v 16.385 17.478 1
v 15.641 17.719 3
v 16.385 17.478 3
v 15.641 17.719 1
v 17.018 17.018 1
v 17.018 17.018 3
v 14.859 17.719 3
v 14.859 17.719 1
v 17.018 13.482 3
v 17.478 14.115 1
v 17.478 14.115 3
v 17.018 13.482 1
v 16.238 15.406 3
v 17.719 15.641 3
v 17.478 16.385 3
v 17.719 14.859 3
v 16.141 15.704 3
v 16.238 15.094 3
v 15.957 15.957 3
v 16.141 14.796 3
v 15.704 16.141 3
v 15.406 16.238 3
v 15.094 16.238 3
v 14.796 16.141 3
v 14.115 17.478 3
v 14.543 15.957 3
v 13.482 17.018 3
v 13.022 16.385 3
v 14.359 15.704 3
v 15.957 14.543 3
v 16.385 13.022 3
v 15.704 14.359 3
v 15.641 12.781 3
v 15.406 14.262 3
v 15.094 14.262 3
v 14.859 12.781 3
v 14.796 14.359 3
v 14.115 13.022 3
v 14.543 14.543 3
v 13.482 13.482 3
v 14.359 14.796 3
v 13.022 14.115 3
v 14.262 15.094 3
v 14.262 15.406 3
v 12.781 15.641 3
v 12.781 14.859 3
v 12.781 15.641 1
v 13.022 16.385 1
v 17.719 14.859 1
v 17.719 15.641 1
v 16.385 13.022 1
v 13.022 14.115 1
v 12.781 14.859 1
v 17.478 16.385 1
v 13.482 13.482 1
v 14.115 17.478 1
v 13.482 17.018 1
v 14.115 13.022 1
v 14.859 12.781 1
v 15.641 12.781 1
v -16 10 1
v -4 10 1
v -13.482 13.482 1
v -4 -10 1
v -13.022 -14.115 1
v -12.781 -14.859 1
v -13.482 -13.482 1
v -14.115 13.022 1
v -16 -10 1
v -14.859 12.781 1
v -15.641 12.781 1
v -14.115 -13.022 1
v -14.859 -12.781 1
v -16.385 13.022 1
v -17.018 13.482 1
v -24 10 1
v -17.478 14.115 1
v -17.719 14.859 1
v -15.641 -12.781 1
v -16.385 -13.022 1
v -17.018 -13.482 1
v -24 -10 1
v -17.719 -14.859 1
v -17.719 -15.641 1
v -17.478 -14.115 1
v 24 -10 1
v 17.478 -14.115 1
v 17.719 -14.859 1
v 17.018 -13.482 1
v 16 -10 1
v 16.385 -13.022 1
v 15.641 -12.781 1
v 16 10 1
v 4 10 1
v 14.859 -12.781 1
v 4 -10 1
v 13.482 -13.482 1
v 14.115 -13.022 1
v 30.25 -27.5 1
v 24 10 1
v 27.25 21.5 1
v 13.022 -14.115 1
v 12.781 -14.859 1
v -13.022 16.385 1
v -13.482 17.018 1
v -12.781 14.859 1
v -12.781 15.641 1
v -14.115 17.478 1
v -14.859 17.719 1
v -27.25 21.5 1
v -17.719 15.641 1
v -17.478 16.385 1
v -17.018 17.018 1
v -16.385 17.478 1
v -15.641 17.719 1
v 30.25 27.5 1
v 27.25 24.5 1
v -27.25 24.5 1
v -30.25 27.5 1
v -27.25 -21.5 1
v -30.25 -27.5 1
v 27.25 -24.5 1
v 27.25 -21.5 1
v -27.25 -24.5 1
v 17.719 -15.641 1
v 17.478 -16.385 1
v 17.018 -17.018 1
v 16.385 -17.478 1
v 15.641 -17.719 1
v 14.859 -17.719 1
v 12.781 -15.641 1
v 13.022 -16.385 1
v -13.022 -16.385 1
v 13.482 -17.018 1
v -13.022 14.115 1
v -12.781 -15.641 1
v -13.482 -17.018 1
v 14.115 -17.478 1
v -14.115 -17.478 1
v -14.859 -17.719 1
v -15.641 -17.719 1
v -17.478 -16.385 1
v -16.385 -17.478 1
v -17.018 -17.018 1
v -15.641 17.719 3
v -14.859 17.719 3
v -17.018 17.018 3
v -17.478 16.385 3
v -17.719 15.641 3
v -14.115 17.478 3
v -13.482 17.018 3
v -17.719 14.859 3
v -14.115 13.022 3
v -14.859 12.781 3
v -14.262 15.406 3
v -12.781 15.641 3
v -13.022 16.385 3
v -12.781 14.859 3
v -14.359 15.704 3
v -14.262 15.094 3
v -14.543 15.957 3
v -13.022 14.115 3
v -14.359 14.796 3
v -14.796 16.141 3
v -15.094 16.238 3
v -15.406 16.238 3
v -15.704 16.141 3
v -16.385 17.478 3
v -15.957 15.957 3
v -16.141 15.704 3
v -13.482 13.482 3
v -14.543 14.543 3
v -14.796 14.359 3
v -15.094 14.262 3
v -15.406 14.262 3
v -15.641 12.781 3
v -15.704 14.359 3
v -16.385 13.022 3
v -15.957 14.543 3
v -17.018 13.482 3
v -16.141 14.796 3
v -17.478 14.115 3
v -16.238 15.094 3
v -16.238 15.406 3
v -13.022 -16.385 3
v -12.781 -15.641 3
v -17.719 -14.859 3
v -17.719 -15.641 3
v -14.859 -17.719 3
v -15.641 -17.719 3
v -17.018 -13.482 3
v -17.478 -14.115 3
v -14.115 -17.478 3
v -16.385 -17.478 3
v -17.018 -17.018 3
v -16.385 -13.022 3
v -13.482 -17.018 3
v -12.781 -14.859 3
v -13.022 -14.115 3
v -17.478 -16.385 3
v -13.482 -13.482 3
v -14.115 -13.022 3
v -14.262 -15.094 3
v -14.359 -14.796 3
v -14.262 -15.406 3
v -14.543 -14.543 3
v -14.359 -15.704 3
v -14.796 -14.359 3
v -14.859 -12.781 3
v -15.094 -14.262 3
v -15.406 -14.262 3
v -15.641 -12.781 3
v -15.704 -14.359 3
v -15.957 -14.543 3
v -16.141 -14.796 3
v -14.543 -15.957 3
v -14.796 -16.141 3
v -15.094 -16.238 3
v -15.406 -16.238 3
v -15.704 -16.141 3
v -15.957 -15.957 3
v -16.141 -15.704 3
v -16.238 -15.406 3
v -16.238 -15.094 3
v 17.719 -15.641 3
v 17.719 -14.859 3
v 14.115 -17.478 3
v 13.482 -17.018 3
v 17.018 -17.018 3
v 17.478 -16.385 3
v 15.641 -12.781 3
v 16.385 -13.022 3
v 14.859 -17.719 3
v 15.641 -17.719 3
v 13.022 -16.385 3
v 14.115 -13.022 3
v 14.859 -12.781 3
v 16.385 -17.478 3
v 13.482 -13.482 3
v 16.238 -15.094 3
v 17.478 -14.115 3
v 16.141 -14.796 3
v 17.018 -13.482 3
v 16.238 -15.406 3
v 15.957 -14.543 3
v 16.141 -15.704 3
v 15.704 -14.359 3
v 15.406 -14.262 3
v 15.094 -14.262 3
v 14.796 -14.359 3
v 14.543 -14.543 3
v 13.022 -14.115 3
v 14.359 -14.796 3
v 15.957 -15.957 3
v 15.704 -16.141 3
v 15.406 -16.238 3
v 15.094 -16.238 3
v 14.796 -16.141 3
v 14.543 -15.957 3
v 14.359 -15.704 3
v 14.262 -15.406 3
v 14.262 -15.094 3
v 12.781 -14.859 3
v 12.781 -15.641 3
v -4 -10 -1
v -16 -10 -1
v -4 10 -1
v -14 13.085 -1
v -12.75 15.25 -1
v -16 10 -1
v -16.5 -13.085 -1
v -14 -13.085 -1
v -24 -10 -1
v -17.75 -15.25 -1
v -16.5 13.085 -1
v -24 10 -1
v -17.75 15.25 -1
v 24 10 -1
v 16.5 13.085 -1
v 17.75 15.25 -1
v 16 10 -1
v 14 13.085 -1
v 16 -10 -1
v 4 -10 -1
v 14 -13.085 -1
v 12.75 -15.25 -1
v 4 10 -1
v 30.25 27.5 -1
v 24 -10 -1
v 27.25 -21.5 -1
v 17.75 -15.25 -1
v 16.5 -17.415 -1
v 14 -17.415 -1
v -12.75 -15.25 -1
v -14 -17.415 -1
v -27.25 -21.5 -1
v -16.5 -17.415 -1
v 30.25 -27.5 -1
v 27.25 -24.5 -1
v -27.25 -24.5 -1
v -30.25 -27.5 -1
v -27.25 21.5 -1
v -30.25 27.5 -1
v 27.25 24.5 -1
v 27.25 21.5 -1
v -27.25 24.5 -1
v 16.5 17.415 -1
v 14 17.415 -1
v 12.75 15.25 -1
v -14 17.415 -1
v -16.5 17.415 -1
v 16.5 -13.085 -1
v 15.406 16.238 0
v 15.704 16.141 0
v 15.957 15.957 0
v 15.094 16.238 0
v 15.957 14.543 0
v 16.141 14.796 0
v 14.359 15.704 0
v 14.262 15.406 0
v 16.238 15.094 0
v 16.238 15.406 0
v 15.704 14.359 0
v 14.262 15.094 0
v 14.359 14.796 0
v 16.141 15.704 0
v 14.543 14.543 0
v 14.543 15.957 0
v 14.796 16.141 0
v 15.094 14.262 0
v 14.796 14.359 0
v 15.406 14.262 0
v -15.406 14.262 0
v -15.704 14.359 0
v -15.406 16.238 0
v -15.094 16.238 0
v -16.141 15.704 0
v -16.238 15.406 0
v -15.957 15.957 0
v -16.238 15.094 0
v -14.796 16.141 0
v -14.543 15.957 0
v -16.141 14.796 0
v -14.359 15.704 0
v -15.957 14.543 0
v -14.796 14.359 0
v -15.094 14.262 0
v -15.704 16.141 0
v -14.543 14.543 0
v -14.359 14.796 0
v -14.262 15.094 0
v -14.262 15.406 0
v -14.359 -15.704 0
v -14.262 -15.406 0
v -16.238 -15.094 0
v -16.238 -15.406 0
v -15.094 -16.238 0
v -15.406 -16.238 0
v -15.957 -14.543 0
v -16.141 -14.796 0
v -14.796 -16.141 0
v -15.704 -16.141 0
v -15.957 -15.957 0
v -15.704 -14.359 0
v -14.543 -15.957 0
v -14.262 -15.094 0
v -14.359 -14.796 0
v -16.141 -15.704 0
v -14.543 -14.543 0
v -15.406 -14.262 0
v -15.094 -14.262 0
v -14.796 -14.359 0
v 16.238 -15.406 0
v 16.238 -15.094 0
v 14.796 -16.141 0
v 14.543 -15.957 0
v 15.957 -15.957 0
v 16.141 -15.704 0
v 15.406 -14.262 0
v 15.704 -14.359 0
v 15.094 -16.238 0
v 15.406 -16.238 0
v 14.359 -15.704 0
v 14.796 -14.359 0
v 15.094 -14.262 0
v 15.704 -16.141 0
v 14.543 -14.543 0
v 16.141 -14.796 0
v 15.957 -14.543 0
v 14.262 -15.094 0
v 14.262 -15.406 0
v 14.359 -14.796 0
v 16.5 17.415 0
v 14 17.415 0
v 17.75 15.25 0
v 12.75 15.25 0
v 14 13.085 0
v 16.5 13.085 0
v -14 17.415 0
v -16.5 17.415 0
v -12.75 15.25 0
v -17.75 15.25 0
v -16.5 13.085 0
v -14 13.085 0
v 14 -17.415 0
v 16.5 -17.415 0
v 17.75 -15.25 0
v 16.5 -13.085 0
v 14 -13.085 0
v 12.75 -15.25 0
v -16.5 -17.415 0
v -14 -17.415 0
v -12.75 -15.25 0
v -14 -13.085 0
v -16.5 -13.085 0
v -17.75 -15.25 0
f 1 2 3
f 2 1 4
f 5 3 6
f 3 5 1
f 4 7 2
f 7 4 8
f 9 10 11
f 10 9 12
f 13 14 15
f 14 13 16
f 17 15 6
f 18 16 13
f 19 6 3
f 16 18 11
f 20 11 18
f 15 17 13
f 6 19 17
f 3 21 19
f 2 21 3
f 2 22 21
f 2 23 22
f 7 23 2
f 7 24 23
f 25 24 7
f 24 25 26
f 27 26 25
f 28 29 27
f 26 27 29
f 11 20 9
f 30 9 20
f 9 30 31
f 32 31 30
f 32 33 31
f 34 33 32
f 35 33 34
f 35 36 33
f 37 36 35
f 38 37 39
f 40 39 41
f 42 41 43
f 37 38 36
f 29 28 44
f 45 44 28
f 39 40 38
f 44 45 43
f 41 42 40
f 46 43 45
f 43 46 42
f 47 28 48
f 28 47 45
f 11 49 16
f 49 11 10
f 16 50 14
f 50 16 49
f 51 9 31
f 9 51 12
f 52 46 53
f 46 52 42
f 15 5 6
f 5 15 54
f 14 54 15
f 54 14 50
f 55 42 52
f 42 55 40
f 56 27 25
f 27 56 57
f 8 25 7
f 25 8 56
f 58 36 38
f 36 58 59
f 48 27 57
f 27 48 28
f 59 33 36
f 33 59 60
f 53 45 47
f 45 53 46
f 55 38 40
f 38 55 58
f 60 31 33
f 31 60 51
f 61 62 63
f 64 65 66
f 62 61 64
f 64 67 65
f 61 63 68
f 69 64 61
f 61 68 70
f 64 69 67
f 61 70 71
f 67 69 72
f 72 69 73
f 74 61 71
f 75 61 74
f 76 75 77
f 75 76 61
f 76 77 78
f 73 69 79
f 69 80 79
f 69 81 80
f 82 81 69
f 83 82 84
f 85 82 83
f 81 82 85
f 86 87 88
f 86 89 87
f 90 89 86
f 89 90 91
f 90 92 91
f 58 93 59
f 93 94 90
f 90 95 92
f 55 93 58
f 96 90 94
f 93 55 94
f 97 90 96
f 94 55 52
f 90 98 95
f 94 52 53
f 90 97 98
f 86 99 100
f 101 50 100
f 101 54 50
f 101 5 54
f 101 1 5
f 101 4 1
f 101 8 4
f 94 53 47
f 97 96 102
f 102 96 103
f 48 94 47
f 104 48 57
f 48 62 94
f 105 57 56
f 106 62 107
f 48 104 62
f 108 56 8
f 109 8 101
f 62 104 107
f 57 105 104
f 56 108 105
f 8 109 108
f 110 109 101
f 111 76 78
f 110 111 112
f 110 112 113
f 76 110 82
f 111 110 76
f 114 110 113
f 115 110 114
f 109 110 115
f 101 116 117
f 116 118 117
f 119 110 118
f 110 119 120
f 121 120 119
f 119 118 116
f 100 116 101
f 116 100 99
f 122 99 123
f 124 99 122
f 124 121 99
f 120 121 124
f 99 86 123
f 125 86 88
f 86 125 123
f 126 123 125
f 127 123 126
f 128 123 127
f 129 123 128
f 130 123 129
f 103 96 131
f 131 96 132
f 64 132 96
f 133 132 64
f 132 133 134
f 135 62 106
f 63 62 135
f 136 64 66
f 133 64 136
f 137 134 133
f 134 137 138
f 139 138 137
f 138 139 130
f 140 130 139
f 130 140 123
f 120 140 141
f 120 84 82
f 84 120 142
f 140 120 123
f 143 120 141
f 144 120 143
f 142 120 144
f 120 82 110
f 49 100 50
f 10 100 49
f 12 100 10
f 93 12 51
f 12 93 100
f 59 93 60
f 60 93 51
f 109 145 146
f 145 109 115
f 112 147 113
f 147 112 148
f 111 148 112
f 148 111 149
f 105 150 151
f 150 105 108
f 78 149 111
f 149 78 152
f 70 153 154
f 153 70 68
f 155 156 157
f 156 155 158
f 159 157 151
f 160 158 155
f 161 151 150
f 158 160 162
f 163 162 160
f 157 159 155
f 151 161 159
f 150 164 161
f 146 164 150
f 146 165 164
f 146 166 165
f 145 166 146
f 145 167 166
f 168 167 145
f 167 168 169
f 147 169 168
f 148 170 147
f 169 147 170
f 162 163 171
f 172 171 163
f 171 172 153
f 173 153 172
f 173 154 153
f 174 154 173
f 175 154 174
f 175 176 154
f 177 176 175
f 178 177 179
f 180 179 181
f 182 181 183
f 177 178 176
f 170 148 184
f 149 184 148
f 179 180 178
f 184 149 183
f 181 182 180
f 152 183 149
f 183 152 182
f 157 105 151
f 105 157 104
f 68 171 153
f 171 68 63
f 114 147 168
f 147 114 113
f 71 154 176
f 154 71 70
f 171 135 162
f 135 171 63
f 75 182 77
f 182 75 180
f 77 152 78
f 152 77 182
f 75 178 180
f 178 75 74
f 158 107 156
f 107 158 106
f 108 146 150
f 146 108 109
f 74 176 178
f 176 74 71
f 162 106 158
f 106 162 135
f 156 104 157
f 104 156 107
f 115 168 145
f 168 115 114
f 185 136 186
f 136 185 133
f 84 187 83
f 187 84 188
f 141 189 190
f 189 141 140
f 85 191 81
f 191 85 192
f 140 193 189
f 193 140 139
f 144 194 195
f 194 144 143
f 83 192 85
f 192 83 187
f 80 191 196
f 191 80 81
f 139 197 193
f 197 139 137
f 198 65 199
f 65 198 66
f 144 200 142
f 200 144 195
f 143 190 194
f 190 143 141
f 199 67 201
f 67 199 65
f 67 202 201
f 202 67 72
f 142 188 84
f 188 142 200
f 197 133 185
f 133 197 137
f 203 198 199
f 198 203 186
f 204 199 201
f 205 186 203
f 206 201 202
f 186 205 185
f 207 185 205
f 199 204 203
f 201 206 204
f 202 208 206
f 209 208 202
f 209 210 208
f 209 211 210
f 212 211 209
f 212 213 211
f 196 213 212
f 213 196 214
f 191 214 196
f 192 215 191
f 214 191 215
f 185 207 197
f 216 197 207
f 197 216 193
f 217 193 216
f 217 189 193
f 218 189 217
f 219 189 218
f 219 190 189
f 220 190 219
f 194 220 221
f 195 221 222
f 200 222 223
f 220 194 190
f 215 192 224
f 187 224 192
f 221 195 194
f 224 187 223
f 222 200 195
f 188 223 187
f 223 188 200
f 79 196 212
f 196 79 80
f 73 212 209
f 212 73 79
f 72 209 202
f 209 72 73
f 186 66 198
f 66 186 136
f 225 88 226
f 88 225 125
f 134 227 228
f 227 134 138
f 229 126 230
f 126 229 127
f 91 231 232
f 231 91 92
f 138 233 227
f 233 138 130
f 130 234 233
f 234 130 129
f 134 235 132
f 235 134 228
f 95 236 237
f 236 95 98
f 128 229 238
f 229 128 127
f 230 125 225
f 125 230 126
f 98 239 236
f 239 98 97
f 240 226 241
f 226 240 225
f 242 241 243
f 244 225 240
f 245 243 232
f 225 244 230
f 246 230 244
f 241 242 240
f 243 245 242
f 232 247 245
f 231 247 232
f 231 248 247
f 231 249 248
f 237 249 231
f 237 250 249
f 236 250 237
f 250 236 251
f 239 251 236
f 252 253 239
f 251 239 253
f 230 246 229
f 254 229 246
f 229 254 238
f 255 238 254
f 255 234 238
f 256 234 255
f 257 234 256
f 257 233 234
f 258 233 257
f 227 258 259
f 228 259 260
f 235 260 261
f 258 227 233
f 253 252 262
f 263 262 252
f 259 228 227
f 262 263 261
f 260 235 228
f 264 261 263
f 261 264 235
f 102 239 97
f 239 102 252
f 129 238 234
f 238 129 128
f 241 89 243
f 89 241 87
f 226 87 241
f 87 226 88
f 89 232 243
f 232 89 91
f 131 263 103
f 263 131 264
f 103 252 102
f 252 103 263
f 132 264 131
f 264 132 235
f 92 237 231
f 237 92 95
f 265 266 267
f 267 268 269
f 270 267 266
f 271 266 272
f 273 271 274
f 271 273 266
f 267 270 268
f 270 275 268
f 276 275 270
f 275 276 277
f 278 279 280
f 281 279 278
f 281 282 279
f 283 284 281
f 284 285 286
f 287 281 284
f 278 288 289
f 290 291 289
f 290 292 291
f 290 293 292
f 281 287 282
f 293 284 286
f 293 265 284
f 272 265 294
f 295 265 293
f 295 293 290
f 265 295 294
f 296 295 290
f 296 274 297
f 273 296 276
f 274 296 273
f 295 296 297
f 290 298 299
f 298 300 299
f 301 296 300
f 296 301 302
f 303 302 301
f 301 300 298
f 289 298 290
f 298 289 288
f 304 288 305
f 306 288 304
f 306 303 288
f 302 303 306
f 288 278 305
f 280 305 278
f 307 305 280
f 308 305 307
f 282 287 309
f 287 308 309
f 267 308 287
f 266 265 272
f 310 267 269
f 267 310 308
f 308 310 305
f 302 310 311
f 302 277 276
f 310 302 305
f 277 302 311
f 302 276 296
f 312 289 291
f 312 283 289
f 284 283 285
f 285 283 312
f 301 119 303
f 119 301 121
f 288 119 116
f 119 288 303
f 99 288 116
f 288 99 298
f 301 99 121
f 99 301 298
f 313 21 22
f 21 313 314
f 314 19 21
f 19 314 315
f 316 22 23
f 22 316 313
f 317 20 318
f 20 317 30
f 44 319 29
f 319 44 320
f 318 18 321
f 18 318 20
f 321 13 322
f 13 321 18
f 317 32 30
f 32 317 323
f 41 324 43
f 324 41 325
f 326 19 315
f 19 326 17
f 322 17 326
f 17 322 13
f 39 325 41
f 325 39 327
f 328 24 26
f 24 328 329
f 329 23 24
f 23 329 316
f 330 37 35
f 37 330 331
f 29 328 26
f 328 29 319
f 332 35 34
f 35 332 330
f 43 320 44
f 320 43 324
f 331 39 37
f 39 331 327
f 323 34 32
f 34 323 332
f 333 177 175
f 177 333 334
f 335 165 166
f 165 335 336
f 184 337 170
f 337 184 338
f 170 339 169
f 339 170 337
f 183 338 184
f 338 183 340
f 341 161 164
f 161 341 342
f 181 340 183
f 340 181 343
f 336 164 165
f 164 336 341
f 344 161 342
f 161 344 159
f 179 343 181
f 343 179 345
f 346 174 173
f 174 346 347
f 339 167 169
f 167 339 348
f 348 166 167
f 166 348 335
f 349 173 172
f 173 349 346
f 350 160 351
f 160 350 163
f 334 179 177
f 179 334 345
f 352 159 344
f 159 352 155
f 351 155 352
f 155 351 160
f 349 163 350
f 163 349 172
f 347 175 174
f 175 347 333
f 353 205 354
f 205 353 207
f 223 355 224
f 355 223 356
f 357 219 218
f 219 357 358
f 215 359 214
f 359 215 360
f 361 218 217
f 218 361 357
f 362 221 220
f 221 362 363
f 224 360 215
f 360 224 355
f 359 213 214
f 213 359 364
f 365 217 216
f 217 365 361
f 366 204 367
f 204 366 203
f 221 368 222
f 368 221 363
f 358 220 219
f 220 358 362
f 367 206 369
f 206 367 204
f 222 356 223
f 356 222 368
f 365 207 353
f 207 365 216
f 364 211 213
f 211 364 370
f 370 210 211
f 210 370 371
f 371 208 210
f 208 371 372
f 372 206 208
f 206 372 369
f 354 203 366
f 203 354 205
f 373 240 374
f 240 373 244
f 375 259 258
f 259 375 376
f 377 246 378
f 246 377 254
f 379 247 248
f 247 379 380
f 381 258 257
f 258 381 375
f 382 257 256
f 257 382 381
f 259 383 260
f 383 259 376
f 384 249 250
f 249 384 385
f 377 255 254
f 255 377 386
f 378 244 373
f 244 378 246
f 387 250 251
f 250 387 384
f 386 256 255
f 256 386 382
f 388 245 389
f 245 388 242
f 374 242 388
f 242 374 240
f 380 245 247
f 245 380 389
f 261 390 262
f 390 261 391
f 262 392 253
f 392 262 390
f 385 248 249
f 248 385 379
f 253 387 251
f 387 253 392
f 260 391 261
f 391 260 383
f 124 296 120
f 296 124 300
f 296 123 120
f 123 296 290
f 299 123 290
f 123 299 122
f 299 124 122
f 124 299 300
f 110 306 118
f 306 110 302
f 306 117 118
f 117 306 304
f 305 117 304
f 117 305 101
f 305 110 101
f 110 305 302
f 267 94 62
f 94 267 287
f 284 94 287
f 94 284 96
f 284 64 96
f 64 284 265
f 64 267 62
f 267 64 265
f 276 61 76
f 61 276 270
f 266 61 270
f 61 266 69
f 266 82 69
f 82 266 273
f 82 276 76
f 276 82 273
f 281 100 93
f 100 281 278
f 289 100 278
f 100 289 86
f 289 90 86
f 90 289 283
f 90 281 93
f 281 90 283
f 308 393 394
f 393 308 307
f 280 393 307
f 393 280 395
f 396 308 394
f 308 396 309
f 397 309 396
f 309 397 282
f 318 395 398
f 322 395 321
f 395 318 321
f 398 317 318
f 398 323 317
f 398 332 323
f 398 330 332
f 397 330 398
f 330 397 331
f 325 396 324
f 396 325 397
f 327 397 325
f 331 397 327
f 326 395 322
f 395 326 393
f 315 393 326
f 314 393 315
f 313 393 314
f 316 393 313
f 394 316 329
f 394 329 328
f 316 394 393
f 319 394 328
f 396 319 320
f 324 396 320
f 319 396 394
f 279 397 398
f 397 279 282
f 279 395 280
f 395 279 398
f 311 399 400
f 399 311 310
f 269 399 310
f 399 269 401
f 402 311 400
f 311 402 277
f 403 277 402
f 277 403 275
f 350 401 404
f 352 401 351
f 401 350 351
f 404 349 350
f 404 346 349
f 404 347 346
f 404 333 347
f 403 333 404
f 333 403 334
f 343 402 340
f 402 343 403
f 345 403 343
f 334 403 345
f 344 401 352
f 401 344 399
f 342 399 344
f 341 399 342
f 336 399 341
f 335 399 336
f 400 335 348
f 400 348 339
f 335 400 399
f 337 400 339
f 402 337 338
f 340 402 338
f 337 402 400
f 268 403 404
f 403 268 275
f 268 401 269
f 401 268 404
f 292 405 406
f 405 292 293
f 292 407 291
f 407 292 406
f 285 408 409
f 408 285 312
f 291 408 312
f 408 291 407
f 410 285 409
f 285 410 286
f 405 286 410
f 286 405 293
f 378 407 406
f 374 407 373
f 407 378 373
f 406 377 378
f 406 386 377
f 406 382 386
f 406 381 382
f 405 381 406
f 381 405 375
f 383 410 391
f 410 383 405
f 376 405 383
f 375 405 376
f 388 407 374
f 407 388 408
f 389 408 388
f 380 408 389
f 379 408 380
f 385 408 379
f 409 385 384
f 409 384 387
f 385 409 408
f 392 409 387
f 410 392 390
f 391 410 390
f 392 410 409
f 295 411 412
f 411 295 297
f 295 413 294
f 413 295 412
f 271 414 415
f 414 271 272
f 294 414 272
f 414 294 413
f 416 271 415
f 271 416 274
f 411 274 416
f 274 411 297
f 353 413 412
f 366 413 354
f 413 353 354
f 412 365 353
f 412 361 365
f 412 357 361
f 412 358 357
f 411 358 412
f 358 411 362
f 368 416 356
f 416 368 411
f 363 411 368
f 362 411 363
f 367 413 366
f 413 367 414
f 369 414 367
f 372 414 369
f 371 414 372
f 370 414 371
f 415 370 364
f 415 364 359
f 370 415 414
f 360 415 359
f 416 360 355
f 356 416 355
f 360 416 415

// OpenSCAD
// Parameters
arm_length = sqrt(2) * 34/2;     // Length from center to end of each arm
hole_dist = sqrt(2) * 30.5/2;
arm_width = 7.5;       // Width of each arm
arm_thickness = 2;   // Thickness of the X
hole_diameter = 2;
hole_depth = arm_thickness + 10;


module beam_between(p1, p2, width, thickness) {
    // Calculate the direction vector
    dx = p2[0] - p1[0];
    dy = p2[1] - p1[1];
    angle = atan2(dy, dx);
    len = sqrt(dx*dx + dy*dy);

    translate(p1-[0,0,thickness/2])
        rotate([0, 0, angle])
            linear_extrude(height = thickness)
                translate([0, -width/2])
                    square([len, width], center = false);
}

module extendedBeam(p1, p2, width, thickness, extension) {
     dx = p2[0] - p1[0];
    dy = p2[1] - p1[1];
    len = sqrt(dx*dx + dy*dy);

    // Normalize the direction vector
    ux = dx / len;
    uy = dy / len;

    // Extend p1 backward and p2 forward
    p1_ext = [p1[0] - ux * extension / 2, p1[1] - uy * extension / 2, p1[2]];
    p2_ext = [p2[0] + ux * extension / 2, p2[1] + uy * extension / 2, p2[2]];

    // Call the original beam module
    beam_between(p1_ext, p2_ext, width, thickness);
}

module hole(p1, hole_diameter, hole_depth) {
    translate(p1)
    cylinder(h = hole_depth, d = hole_diameter, center = true, $fn = 20);
}
module hole_custom_sides(p1, hole_diameter, hole_depth, side_num) {
    translate(p1)
    cylinder(h = hole_depth, d = hole_diameter, center = true, $fn = side_num);
}

// Main X shape with holes
difference() {
    union() {
        beam_between([-30.5/2-15,0,0],[30.5/2+15,0,0],55,arm_thickness);
        for (angle = [45, 135, 225, 315]) {
            rotate([0, 0, angle])
                translate([hole_dist, 0, 2])
                    cylinder(h = 2, d = hole_diameter*2.5, center = true, $fn = 20);
        }
        
    }

    // Holes at the ends of the X
    for (angle = [45, 135, 225, 315]) {
        rotate([0, 0, angle])
            translate([hole_dist, 0, 0])
                cylinder(h = hole_depth, d = hole_diameter, center = true, $fn = 20);
    }
    beam_between([-30.5/2-12,-23,0],[30.5/2+12,-23,0],3,arm_thickness*2);
    beam_between([-30.5/2-12,23,0],[30.5/2+12,23,0],3,arm_thickness*2);
    beam_between([0,10,0],[0,-10,0],8,50);
    beam_between([-20,10,0],[-20,-10,0],8,50);
    beam_between([20,10,0],[20,-10,0],8,50);
    
    hole_custom_sides([30.5/2,30.5/2,-1],5, 2, 6);
    hole_custom_sides([-30.5/2,30.5/2,-1],5, 2, 6);
    hole_custom_sides([30.5/2,-30.5/2,-1],5, 2, 6);
    hole_custom_sides([-30.5/2,-30.5/2,-1],5, 2, 6);
}
